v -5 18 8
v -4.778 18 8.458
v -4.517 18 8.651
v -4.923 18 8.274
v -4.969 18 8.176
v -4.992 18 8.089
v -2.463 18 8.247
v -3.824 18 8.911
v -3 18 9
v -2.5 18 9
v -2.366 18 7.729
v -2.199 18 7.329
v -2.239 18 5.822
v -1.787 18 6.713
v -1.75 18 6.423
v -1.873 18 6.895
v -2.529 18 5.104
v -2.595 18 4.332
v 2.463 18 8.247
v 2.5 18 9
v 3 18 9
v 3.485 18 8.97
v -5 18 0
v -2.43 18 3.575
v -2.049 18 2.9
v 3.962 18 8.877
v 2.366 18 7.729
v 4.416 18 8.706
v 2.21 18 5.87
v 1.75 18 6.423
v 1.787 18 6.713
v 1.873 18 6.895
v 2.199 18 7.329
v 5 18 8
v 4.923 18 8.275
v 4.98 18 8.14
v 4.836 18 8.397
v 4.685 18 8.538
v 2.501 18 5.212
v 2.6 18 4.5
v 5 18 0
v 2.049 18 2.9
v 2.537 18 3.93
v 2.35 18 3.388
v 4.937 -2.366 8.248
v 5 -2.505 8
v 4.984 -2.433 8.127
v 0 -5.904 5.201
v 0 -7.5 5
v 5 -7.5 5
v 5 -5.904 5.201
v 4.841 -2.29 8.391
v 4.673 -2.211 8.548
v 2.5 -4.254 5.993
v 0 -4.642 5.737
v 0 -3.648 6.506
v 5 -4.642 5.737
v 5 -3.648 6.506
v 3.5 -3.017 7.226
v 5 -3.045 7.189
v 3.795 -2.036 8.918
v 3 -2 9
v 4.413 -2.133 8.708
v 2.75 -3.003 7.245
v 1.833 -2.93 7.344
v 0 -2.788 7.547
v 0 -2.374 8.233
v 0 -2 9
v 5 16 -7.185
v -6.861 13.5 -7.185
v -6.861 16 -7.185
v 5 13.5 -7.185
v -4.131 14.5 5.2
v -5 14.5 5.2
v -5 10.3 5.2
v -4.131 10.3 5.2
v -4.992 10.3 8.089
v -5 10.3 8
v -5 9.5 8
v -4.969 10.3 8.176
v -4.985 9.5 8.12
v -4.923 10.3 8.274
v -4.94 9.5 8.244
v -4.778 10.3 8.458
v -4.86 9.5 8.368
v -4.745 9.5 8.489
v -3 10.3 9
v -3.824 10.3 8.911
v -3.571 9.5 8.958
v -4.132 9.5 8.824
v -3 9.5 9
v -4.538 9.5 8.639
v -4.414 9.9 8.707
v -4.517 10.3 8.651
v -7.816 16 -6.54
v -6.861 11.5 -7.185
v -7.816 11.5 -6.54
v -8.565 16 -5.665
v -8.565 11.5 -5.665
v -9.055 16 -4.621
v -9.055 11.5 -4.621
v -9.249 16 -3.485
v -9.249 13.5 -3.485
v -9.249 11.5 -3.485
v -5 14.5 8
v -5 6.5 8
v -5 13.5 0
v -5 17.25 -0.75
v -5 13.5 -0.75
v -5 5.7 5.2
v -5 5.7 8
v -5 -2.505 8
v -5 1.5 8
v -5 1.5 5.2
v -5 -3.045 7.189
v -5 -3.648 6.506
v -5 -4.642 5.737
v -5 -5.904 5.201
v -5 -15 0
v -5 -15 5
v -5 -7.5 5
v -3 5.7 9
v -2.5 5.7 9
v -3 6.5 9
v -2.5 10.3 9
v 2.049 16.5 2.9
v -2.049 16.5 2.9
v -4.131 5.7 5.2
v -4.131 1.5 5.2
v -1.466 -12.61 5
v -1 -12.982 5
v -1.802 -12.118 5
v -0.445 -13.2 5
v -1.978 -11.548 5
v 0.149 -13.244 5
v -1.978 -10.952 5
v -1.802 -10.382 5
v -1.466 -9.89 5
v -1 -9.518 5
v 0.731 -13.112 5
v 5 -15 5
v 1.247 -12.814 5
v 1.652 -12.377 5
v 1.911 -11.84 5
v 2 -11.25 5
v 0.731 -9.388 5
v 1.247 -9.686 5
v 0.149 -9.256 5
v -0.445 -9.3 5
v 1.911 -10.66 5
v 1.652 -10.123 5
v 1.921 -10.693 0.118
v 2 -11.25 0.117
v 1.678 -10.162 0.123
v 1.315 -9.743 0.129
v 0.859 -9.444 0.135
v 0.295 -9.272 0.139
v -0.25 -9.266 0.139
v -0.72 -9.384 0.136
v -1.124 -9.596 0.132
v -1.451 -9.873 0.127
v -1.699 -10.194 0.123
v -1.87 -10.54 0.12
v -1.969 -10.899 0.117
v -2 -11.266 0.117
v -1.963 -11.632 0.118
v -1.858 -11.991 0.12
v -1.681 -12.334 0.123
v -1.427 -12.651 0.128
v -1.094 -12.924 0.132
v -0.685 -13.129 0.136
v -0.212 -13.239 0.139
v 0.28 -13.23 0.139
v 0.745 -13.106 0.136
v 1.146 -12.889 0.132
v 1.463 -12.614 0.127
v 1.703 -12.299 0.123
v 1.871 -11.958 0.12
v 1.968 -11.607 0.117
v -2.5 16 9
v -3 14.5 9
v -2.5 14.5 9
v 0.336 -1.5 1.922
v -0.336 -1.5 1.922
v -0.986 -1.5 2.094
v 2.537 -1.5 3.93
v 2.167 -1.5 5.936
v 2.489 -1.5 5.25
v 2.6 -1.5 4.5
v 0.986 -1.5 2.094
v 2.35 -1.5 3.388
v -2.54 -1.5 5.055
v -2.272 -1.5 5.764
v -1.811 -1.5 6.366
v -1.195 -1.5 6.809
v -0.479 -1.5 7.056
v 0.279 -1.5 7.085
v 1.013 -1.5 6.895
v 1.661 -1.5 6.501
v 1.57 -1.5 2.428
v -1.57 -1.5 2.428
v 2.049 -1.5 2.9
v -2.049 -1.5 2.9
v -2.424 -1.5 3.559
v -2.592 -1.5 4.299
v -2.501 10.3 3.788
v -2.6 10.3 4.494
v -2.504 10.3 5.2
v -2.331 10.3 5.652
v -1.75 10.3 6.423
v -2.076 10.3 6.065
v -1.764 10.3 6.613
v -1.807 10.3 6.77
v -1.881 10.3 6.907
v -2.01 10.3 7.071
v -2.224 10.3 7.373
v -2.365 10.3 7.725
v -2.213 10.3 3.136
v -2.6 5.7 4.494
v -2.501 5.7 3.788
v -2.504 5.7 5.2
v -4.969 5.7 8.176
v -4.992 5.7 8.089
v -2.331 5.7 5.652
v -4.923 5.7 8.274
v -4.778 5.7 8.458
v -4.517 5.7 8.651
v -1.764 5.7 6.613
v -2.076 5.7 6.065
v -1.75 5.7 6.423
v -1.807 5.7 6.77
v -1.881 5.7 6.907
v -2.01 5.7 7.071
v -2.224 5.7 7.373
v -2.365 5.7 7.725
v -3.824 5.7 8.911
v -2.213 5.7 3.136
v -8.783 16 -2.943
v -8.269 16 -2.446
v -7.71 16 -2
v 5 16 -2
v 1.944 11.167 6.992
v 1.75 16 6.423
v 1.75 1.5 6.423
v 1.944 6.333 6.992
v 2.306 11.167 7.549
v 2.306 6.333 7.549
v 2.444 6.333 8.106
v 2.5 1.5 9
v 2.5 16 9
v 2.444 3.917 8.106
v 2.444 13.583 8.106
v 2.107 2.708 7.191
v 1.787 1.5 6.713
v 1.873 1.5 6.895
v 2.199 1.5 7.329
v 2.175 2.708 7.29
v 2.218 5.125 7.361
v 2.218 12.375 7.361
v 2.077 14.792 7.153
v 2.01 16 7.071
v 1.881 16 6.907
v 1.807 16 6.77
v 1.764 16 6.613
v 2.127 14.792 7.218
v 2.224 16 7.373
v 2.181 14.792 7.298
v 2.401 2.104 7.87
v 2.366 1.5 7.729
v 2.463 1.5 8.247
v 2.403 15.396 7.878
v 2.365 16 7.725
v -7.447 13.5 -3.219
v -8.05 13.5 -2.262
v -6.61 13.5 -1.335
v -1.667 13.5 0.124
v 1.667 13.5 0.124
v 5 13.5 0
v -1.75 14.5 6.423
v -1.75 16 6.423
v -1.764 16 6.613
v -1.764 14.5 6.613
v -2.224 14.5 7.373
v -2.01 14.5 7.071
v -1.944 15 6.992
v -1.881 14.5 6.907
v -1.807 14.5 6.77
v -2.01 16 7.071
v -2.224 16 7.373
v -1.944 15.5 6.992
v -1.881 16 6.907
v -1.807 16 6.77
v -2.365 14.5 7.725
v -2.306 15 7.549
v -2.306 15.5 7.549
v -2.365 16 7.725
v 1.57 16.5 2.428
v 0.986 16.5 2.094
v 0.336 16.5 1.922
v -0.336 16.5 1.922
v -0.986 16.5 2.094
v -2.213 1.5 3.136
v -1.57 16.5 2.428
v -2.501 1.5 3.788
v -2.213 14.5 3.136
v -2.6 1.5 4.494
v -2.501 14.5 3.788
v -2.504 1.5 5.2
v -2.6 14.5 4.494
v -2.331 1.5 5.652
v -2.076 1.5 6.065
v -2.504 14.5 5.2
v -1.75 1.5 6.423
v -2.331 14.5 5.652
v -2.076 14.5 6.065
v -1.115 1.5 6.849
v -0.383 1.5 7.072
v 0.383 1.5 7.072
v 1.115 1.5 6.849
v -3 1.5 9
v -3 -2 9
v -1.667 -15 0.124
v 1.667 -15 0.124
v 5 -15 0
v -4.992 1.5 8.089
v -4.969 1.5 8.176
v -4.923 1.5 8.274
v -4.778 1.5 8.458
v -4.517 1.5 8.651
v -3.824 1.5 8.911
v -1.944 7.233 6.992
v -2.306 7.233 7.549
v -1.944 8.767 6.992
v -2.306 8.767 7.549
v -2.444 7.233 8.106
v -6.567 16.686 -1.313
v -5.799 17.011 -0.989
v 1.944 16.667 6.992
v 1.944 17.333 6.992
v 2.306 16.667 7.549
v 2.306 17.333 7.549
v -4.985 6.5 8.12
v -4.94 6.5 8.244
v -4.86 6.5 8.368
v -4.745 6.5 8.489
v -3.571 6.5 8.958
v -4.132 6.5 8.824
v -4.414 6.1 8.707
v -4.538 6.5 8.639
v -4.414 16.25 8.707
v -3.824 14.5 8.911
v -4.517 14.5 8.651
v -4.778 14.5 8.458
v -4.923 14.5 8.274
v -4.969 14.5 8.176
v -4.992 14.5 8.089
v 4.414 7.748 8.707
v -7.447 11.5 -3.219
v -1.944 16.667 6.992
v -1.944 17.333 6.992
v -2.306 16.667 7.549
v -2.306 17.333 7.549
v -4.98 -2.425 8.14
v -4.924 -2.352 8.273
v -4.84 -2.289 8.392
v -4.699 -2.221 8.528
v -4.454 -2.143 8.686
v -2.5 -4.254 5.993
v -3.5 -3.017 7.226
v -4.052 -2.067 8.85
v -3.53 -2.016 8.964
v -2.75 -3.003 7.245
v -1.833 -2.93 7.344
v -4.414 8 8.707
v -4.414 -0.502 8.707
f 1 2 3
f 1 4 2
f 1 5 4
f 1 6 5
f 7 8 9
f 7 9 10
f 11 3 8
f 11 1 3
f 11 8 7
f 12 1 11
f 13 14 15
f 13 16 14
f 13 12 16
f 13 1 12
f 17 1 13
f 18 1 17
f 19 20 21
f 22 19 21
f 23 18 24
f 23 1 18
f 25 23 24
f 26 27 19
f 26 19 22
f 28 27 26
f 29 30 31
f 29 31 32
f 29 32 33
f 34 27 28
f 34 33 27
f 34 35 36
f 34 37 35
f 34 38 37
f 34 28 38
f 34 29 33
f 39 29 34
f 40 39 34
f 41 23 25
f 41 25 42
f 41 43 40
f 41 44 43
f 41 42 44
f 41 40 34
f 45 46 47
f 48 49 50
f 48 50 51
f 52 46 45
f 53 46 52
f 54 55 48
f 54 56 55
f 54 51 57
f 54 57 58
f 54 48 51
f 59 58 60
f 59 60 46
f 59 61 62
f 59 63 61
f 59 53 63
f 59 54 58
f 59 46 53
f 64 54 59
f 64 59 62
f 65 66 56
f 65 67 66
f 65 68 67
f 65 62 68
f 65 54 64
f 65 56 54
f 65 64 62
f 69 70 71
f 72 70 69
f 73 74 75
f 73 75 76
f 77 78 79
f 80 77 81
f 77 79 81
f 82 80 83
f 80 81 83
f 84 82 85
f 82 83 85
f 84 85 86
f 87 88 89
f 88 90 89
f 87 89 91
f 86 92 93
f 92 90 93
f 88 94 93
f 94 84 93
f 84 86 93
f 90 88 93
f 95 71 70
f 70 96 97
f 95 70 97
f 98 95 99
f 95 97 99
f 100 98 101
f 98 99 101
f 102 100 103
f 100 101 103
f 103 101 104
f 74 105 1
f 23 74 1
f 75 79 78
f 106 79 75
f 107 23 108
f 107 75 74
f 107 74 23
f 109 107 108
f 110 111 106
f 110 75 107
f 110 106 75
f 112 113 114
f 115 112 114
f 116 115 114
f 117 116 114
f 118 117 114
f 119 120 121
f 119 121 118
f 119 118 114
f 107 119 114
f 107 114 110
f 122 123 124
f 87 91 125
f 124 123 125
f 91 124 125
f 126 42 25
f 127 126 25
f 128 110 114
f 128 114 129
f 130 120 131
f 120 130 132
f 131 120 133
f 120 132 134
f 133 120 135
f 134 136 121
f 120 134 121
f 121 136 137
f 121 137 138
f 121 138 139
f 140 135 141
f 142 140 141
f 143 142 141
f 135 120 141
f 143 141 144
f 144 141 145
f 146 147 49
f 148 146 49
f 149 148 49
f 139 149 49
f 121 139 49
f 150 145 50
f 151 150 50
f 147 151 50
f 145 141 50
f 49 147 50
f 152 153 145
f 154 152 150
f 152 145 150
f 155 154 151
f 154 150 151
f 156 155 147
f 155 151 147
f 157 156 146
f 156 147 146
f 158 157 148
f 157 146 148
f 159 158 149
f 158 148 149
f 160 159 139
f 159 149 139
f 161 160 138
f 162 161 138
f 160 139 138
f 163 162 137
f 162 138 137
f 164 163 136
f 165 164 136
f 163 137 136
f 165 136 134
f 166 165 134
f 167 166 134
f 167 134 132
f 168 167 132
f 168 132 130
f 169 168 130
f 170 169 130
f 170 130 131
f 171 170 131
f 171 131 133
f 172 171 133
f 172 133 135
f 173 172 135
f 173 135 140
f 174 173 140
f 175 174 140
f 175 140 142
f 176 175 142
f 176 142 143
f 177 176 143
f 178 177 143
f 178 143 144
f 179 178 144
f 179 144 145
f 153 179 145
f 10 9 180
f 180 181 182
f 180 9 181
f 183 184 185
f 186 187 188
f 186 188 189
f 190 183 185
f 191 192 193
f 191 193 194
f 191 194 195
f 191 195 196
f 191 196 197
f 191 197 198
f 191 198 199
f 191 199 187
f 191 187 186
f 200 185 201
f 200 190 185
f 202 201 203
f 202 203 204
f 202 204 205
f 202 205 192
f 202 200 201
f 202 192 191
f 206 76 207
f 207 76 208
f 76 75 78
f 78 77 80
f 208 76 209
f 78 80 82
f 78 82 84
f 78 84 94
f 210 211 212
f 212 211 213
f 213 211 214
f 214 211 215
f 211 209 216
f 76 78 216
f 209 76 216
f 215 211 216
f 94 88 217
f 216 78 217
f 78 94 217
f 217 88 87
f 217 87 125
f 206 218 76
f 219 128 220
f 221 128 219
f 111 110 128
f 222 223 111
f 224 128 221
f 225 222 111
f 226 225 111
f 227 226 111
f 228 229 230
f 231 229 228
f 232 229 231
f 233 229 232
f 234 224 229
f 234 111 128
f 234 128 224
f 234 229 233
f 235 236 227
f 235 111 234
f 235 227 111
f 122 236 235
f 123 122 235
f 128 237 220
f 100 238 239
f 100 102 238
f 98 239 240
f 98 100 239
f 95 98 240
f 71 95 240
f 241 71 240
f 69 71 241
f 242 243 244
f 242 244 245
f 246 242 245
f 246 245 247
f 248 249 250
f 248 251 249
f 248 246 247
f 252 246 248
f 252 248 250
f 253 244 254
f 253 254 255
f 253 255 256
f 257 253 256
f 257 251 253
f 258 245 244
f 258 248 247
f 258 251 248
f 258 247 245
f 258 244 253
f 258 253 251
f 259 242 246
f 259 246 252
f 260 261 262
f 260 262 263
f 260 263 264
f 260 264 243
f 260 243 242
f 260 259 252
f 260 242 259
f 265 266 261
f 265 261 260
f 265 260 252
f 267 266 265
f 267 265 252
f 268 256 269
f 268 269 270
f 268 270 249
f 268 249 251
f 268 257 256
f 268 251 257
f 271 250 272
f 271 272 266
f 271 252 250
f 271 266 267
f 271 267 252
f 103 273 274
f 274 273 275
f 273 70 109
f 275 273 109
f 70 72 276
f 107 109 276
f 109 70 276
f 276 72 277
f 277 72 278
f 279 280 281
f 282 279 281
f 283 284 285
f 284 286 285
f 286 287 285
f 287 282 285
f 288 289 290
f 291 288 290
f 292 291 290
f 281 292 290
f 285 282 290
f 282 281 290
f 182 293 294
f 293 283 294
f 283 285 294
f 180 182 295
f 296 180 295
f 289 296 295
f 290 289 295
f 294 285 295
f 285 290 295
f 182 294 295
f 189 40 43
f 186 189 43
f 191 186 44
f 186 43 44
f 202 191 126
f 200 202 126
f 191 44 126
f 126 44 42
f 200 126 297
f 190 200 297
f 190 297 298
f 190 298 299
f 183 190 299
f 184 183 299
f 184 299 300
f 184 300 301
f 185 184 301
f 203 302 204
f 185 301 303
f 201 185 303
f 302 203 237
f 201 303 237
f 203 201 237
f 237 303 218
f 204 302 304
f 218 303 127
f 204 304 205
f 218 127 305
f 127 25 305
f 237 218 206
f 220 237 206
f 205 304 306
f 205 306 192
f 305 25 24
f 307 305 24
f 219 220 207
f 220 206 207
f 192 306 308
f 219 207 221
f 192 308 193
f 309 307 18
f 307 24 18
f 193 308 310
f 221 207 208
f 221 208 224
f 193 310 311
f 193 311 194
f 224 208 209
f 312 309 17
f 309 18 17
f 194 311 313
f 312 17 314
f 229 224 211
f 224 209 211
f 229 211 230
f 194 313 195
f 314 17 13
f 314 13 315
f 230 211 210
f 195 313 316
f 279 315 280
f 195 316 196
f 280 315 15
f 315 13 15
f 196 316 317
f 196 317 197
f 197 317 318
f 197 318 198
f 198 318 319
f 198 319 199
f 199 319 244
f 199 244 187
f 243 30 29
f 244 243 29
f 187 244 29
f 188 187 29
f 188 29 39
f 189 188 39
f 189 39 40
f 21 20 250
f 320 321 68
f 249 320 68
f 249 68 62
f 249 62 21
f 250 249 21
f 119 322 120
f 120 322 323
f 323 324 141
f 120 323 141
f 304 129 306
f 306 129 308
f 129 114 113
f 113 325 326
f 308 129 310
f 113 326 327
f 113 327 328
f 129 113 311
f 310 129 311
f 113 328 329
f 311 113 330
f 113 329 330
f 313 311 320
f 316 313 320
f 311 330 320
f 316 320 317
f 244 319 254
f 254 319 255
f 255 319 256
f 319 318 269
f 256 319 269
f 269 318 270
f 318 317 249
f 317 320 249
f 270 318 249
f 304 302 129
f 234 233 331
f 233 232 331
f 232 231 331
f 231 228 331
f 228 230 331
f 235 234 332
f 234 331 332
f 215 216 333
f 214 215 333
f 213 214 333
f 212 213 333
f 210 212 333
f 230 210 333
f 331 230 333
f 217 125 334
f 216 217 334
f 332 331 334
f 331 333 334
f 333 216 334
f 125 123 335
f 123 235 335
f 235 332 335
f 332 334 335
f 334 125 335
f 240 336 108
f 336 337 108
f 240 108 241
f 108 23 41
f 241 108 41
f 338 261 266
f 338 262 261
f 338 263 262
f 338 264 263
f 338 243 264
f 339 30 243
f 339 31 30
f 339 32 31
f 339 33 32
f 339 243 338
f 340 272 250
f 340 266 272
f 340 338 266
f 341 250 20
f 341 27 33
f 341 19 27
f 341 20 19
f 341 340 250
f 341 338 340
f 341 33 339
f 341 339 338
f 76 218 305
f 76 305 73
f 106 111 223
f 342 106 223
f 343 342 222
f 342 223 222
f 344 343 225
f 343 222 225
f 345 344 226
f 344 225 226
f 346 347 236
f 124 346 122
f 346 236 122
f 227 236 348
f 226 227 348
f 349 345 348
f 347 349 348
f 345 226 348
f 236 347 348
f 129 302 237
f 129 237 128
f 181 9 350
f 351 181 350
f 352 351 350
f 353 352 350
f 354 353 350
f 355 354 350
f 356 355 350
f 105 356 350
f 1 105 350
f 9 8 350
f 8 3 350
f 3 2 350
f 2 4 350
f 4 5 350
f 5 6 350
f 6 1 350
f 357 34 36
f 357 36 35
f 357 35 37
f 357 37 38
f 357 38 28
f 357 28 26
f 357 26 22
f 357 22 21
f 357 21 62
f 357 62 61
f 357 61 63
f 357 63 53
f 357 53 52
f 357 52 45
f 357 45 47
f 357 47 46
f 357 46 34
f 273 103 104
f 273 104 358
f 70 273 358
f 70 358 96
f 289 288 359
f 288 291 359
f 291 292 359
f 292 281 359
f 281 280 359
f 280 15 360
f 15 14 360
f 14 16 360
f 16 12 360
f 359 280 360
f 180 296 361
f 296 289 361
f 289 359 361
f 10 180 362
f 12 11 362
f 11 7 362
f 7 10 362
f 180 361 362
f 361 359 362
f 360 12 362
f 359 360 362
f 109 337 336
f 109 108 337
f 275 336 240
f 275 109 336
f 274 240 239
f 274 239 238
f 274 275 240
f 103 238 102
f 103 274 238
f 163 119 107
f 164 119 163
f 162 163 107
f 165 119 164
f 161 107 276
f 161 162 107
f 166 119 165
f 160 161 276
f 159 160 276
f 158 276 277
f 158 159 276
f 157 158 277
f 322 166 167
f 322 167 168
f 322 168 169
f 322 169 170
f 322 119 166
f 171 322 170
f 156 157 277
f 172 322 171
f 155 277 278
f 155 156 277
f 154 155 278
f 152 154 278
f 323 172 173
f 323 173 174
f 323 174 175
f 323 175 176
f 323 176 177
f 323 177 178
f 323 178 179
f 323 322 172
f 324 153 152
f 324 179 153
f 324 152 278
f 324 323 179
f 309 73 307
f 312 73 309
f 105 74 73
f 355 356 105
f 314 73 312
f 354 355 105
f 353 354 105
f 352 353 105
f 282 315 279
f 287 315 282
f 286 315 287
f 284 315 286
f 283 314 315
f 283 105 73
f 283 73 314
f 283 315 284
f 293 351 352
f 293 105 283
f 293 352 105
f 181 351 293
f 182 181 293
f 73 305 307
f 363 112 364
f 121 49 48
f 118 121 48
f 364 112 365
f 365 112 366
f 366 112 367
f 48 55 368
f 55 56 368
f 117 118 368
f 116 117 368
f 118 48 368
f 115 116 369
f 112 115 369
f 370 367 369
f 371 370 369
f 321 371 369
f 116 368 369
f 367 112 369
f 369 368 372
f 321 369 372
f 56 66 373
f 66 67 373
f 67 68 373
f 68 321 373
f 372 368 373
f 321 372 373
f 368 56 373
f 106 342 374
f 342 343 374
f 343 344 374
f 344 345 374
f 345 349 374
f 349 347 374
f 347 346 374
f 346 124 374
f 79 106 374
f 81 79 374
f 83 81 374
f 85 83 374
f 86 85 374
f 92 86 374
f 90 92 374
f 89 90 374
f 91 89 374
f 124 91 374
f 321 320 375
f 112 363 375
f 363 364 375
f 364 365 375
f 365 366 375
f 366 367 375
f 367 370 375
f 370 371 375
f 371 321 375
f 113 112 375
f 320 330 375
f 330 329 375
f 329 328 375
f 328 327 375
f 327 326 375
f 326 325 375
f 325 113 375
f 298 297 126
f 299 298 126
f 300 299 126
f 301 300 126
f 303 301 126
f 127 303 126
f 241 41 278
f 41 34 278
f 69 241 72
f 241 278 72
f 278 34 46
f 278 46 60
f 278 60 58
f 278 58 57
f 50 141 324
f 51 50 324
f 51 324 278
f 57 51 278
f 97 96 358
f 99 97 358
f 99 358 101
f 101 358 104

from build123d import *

# Parameters (mm, degrees)
BOSS_EXTRUDE1_DEPTH             = 5
CUT_EXTRUDE1_REACH              = 19.493
SKETCH2_R                       = 2
BOSS_EXTRUDE2_DEPTH             = 5
CUT_EXTRUDE4_DEPTH              = 17.5
CUT_EXTRUDE10_START             = 17.5
CUT_EXTRUDE10_DEPTH             = 16
SKETCH15_W                      = 3.25
SKETCH15_H                      = 4.2
CUT_EXTRUDE11_DEPTH             = 3.8
CHAMFER2_START                  = 1.5
CHAMFER2_DEPTH                  = 4.2
CHAMFER2_START_2                = 10.3
CHAMFER2_2_DEPTH                = 4.2
CUT_EXTRUDE7_START              = -15
CUT_EXTRUDE7_DEPTH              = 28.5
BOSS_EXTRUDE7_DEPTH             = 2.5
BOSS_EXTRUDE8_DEPTH             = 2
BOSS_EXTRUDE8_DIRECTION_2_REACH = 33.286
SKETCH17_W                      = 10
SKETCH17_H                      = 9
BOSS_EXTRUDE10_DEPTH            = 2
CUT_EXTRUDE12_START             = 18
CUT_EXTRUDE12_DEPTH             = 2
CUT_EXTRUDE13_START             = 2
CUT_EXTRUDE13_DEPTH             = 2
CUT_EXTRUDE14_START             = 0.5
CUT_EXTRUDE14_DEPTH             = 0.5
FILLET8_SIZE                    = 2
FILLET8_SIZE_2                  = 1
FILLET6_SIZE                    = 1
FILLET6_SIZE_2                  = 2
CHAMFER3_SIZE                   = 2


with BuildPart() as part:
    # Sketch1 → Boss-Extrude1 (new, symmetric)
    with BuildSketch(Plane(origin=(0, 0, 0), x_dir=(0, 0, -1), z_dir=(1, 0, 0))):
        with BuildLine():
            Line((-5, -15), (-5, -7.5))
            add(Edge.make_bspline(
                [(-5, -7.5), (-4.98696359, -3.758210307), (-9, -2)],
                knots=[0, 0, 0, 1, 1, 1], degree=2))
            Line((-9, -2), (-9, 16))
            Line((-9, 16), (0, 16))
            Line((0, 16), (0, 0))
            Line((0, 0), (0, -15))
            Line((0, -15), (-5, -15))
        make_face()
    extrude(amount=BOSS_EXTRUDE1_DEPTH, both=True)

    # Sketch2 → Cut-Extrude1 (cut, up to next)
    with BuildSketch(Plane.XY.offset(5), mode=Mode.PRIVATE) as cut_extrude1_sk1:
        with Locations((0, -11.25)):
            Circle(SKETCH2_R)
    cut_extrude1_tool1 = extrude(cut_extrude1_sk1.sketch, amount=-CUT_EXTRUDE1_REACH, mode=Mode.PRIVATE) & part.part
    add(cut_extrude1_tool1.solids().sort_by_distance((0, -11.25, 5))[0], mode=Mode.SUBTRACT)

    # Sketch5 → Boss-Extrude2 (add, symmetric)
    with BuildSketch(Plane(origin=(0, 0, 0), x_dir=(0, 0, -1), z_dir=(1, 0, 0))):
        with BuildLine():
            Line((1.5, 13.5), (0, 13.5))
            Line((0, 13.5), (0, 16))
            add(Edge.make_bspline(
                [(1.5, 13.5), (1.5, 15.23543045), (1.140641964, 16), (0, 16)],
                knots=[0, 0, 0, 0, 1, 1, 1, 1], degree=3))
        make_face()
    extrude(amount=BOSS_EXTRUDE2_DEPTH, both=True)

    # Sketch6 → Cut-Extrude4 (cut)
    with BuildSketch(Plane(origin=(0, 16, 0), x_dir=(1, 0, 0), z_dir=(0, 1, 0))):
        with BuildLine():
            ThreePointArc((2.049390153, -2.9), (0, -1.9), (-2.049390153, -2.9))
            Line((-2.049390153, -2.9), (2.049390153, -2.9))
        make_face()
        with BuildLine():
            Line((2.049390153, -2.9), (-2.049390153, -2.9))
            ThreePointArc((-2.049390153, -2.9), (-0.846045389, -6.958496939), (2.6, -4.5))
            ThreePointArc((2.6, -4.5), (2.458496939, -3.653954611), (2.049390153, -2.9))
        make_face()
    extrude(amount=-CUT_EXTRUDE4_DEPTH, mode=Mode.SUBTRACT)

    # Sketch13 → Cut-Extrude10 (cut)
    with BuildSketch(Plane(origin=(0, 0, 0), x_dir=(1, 0, 0), z_dir=(0, 1, 0)).offset(CUT_EXTRUDE10_START)):
        with BuildLine():
            ThreePointArc((1.75, -6.422888452), (0, -7.1), (-1.75, -6.422888452))
            add(Edge.make_bspline(
                [(-1.75, -6.422888452), (-1.75, -7.3), (-2.5, -6.8), (-2.5, -9)],
                knots=[0, 0, 0, 0, 1, 1, 1, 1], degree=3))
            Line((-2.5, -9), (2.5, -9))
            add(Edge.make_bspline(
                [(1.75, -6.422888452), (1.75, -7.3), (2.5, -6.8), (2.5, -9)],
                knots=[0, 0, 0, 0, 1, 1, 1, 1], degree=3))
        make_face()
    extrude(amount=-CUT_EXTRUDE10_DEPTH, mode=Mode.SUBTRACT)

    # Sketch15 → Cut-Extrude11 (cut)
    with BuildSketch(Plane.XY.offset(9)):
        with Locations((-3.375, 3.6)):
            Rectangle(SKETCH15_W, SKETCH15_H)
        with Locations((-3.375, 12.4)):
            Rectangle(SKETCH15_W, SKETCH15_H)
    extrude(amount=-CUT_EXTRUDE11_DEPTH, mode=Mode.SUBTRACT)

    # Chamfer2: read off the stored shape, not the designer's step
    # Chamfer2 outline → Chamfer2 (cut)
    with BuildSketch(Plane(origin=(0, 0, 0), x_dir=(1, 0, 0), z_dir=(0, 1, 0)).offset(CHAMFER2_START)):
        with BuildLine():
            ThreePointArc((-2.503996805, -5.2), (-2.574603342, -4.137484302), (-2.213344965, -3.13577712))
            Line((-2.213344965, -3.13577712), (-4.130598027, -5.2))
            Line((-4.130598027, -5.2), (-2.503996805, -5.2))
        make_face()
    extrude(amount=CHAMFER2_DEPTH, mode=Mode.SUBTRACT)

    # Chamfer2 2 outline → Chamfer2 2 (cut)
    with BuildSketch(Plane(origin=(0, 0, 0), x_dir=(1, 0, 0), z_dir=(0, 1, 0)).offset(CHAMFER2_START_2)):
        with BuildLine():
            ThreePointArc((-2.503996805, -5.2), (-2.574603342, -4.137484302), (-2.213344965, -3.13577712))
            Line((-2.213344965, -3.13577712), (-4.130598027, -5.2))
            Line((-4.130598027, -5.2), (-2.503996805, -5.2))
        make_face()
    extrude(amount=CHAMFER2_2_DEPTH, mode=Mode.SUBTRACT)

    # Sketch9 → Cut-Extrude7 (cut)
    with BuildSketch(Plane(origin=(0, 0, 0), x_dir=(1, 0, 0), z_dir=(0, 1, 0)).offset(CUT_EXTRUDE7_START)):
        with BuildLine():
            Line((5, 0), (-5, 0))
            ThreePointArc((-5, 0), (0, -0.138996222), (5, 0))
        make_face()
    extrude(amount=CUT_EXTRUDE7_DEPTH, mode=Mode.SUBTRACT)

    # Sketch12 → Boss-Extrude7 (add)
    with BuildSketch(Plane.XZ.offset(-13.5)):
        with BuildLine():
            Line((5, 0), (-5, 0))
            Line((-5, 0), (-5, -0.75))
            ThreePointArc((-5, -0.75), (-7.356122713, -1.757737527), (-9.249008864, -3.485114493))
            Line((-9.249008864, -3.485114493), (-7.446859958, -3.218783834))
            Line((-7.446859958, -3.218783834), (-6.860693731, -7.185127133))
            Line((-6.860693731, -7.185127133), (5, -7.185127133))
            Line((5, -7.185127133), (5, 0))
        make_face()
    extrude(amount=-BOSS_EXTRUDE7_DEPTH)

    # Sketch12<4> → Boss-Extrude8 (add)
    with BuildSketch(Plane.XZ.offset(-13.5)):
        with BuildLine():
            Line((-9.249008864, -3.485114493), (-7.446859958, -3.218783834))
            Line((-7.446859958, -3.218783834), (-6.860693731, -7.185127133))
            ThreePointArc((-6.860693731, -7.185127133), (-8.565464188, -5.664715496), (-9.249008864, -3.485114493))
        make_face()
    extrude(amount=BOSS_EXTRUDE8_DEPTH)

    # Boss-Extrude8 direction 2: up to this face of the body (flat: up to its plane)
    boss_extrude8_direction_2_end = Plane(part.part.faces().sort_by_distance((-0.643733598, 16, -0.592776419))[0])
    # Sketch12<4> → Boss-Extrude8 direction 2 (add, up to the picked face)
    with BuildSketch(Plane.XZ.offset(-13.5), mode=Mode.PRIVATE) as boss_extrude8_direction_2_sk1:
        with BuildLine():
            Line((-9.249008864, -3.485114493), (-7.446859958, -3.218783834))
            Line((-7.446859958, -3.218783834), (-6.860693731, -7.185127133))
            ThreePointArc((-6.860693731, -7.185127133), (-8.565464188, -5.664715496), (-9.249008864, -3.485114493))
        make_face()
    boss_extrude8_direction_2_tool1 = split(extrude(boss_extrude8_direction_2_sk1.sketch, amount=-BOSS_EXTRUDE8_DIRECTION_2_REACH, mode=Mode.PRIVATE), bisect_by=boss_extrude8_direction_2_end, keep=Keep.BOTH, mode=Mode.PRIVATE)
    add(boss_extrude8_direction_2_tool1.solids().sort_by(Axis((-7.987517, 13.5, -4.907532), (0, 1, 0)))[0])

    # Sketch17 → Boss-Extrude10 (add)
    with BuildSketch(Plane(origin=(0, 16, 0), x_dir=(1, 0, 0), z_dir=(0, 1, 0))):
        with Locations((0, -4.5)):
            Rectangle(SKETCH17_W, SKETCH17_H)
    extrude(amount=BOSS_EXTRUDE10_DEPTH)

    # Sketch13<3> → Cut-Extrude12 (cut)
    with BuildSketch(Plane(origin=(0, 0, 0), x_dir=(1, 0, 0), z_dir=(0, 1, 0)).offset(CUT_EXTRUDE12_START)):
        with BuildLine():
            Line((-2.5, -9), (2.5, -9))
            add(Edge.make_bspline(
                [(1.75, -6.422888452), (1.75, -7.3), (2.5, -6.8), (2.5, -9)],
                knots=[0, 0, 0, 0, 1, 1, 1, 1], degree=3))
            ThreePointArc((1.75, -6.422888452), (0, -7.1), (-1.75, -6.422888452))
            add(Edge.make_bspline(
                [(-1.75, -6.422888452), (-1.75, -7.3), (-2.5, -6.8), (-2.5, -9)],
                knots=[0, 0, 0, 0, 1, 1, 1, 1], degree=3))
        make_face()
    extrude(amount=-CUT_EXTRUDE12_DEPTH, mode=Mode.SUBTRACT)

    # Sketch6<4> → Cut-Extrude13 (cut)
    with BuildSketch(Plane(origin=(0, 16, 0), x_dir=(1, 0, 0), z_dir=(0, 1, 0)).offset(CUT_EXTRUDE13_START)):
        with BuildLine():
            Line((2.049390153, -2.9), (-2.049390153, -2.9))
            ThreePointArc((-2.049390153, -2.9), (-0.846045389, -6.958496939), (2.6, -4.5))
            ThreePointArc((2.6, -4.5), (2.458496939, -3.653954611), (2.049390153, -2.9))
        make_face()
    extrude(amount=-CUT_EXTRUDE13_DEPTH, mode=Mode.SUBTRACT)

    # Sketch6<5> → Cut-Extrude14 (cut)
    with BuildSketch(Plane(origin=(0, 16, 0), x_dir=(1, 0, 0), z_dir=(0, 1, 0)).offset(CUT_EXTRUDE14_START)):
        with BuildLine():
            ThreePointArc((2.049390153, -2.9), (0, -1.9), (-2.049390153, -2.9))
            Line((-2.049390153, -2.9), (2.049390153, -2.9))
        make_face()
        with BuildLine():
            Line((2.049390153, -2.9), (-2.049390153, -2.9))
            ThreePointArc((-2.049390153, -2.9), (-0.846045389, -6.958496939), (2.6, -4.5))
            ThreePointArc((2.6, -4.5), (2.458496939, -3.653954611), (2.049390153, -2.9))
        make_face()
    extrude(amount=-CUT_EXTRUDE14_DEPTH, mode=Mode.SUBTRACT)

    # Fillet8
    # a fillet whose section is not a circle: 2, 1 mm, written as the material it takes off along each edge
    with BuildSketch(Plane(origin=(5, 23, 9), x_dir=(-1, 0, 0), z_dir=(0, -1, 0))) as fillet8_piece_1:
        with BuildLine():
            Bezier((FILLET8_SIZE, 0), (0, 0), (0, FILLET8_SIZE_2), weights=[1, 0.707106781, 1])
            Line((0, FILLET8_SIZE_2), (0, 0))
            Line((0, 0), (FILLET8_SIZE, 0))
        make_face()
    extrude(amount=30, mode=Mode.SUBTRACT)

    # Fillet6
    # a fillet whose section is not a circle: 2, 1 mm, written as the material it takes off along each edge
    with BuildSketch(Plane(origin=(-5, -7, 9), x_dir=(0, 0, -1), z_dir=(0, 1, 0)), Plane(origin=(-5, 9.5, 9), x_dir=(0, 0, -1), z_dir=(0, 1, 0))) as fillet6_piece_1:
        with BuildLine():
            Bezier((FILLET6_SIZE, 0), (0, 0), (0, -FILLET6_SIZE_2), weights=[1, 0.707106781, 1])
            Line((0, -FILLET6_SIZE_2), (0, 0))
            Line((0, 0), (FILLET6_SIZE, 0))
        make_face()
    extrude(amount=13.5, mode=Mode.SUBTRACT)
    with BuildSketch(Plane(origin=(-5, 0.7, 9), x_dir=(0, 0, -1), z_dir=(0, 1, 0))) as fillet6_piece_2:
        with BuildLine():
            Bezier((FILLET6_SIZE, 0), (0, 0), (0, -FILLET6_SIZE_2), weights=[1, 0.707106781, 1])
            Line((0, -FILLET6_SIZE_2), (0, 0))
            Line((0, 0), (FILLET6_SIZE, 0))
        make_face()
    extrude(amount=14.6, mode=Mode.SUBTRACT)

    # Chamfer3
    chamfer3_edges = [part.edges().sort_by_distance(p)[0] for p in [
        (0, 16, 0),
    ]]
    chamfer(chamfer3_edges, length=CHAMFER3_SIZE - 0.0001)  # a hair under: the kernel refuses the full size


solid = part.part
